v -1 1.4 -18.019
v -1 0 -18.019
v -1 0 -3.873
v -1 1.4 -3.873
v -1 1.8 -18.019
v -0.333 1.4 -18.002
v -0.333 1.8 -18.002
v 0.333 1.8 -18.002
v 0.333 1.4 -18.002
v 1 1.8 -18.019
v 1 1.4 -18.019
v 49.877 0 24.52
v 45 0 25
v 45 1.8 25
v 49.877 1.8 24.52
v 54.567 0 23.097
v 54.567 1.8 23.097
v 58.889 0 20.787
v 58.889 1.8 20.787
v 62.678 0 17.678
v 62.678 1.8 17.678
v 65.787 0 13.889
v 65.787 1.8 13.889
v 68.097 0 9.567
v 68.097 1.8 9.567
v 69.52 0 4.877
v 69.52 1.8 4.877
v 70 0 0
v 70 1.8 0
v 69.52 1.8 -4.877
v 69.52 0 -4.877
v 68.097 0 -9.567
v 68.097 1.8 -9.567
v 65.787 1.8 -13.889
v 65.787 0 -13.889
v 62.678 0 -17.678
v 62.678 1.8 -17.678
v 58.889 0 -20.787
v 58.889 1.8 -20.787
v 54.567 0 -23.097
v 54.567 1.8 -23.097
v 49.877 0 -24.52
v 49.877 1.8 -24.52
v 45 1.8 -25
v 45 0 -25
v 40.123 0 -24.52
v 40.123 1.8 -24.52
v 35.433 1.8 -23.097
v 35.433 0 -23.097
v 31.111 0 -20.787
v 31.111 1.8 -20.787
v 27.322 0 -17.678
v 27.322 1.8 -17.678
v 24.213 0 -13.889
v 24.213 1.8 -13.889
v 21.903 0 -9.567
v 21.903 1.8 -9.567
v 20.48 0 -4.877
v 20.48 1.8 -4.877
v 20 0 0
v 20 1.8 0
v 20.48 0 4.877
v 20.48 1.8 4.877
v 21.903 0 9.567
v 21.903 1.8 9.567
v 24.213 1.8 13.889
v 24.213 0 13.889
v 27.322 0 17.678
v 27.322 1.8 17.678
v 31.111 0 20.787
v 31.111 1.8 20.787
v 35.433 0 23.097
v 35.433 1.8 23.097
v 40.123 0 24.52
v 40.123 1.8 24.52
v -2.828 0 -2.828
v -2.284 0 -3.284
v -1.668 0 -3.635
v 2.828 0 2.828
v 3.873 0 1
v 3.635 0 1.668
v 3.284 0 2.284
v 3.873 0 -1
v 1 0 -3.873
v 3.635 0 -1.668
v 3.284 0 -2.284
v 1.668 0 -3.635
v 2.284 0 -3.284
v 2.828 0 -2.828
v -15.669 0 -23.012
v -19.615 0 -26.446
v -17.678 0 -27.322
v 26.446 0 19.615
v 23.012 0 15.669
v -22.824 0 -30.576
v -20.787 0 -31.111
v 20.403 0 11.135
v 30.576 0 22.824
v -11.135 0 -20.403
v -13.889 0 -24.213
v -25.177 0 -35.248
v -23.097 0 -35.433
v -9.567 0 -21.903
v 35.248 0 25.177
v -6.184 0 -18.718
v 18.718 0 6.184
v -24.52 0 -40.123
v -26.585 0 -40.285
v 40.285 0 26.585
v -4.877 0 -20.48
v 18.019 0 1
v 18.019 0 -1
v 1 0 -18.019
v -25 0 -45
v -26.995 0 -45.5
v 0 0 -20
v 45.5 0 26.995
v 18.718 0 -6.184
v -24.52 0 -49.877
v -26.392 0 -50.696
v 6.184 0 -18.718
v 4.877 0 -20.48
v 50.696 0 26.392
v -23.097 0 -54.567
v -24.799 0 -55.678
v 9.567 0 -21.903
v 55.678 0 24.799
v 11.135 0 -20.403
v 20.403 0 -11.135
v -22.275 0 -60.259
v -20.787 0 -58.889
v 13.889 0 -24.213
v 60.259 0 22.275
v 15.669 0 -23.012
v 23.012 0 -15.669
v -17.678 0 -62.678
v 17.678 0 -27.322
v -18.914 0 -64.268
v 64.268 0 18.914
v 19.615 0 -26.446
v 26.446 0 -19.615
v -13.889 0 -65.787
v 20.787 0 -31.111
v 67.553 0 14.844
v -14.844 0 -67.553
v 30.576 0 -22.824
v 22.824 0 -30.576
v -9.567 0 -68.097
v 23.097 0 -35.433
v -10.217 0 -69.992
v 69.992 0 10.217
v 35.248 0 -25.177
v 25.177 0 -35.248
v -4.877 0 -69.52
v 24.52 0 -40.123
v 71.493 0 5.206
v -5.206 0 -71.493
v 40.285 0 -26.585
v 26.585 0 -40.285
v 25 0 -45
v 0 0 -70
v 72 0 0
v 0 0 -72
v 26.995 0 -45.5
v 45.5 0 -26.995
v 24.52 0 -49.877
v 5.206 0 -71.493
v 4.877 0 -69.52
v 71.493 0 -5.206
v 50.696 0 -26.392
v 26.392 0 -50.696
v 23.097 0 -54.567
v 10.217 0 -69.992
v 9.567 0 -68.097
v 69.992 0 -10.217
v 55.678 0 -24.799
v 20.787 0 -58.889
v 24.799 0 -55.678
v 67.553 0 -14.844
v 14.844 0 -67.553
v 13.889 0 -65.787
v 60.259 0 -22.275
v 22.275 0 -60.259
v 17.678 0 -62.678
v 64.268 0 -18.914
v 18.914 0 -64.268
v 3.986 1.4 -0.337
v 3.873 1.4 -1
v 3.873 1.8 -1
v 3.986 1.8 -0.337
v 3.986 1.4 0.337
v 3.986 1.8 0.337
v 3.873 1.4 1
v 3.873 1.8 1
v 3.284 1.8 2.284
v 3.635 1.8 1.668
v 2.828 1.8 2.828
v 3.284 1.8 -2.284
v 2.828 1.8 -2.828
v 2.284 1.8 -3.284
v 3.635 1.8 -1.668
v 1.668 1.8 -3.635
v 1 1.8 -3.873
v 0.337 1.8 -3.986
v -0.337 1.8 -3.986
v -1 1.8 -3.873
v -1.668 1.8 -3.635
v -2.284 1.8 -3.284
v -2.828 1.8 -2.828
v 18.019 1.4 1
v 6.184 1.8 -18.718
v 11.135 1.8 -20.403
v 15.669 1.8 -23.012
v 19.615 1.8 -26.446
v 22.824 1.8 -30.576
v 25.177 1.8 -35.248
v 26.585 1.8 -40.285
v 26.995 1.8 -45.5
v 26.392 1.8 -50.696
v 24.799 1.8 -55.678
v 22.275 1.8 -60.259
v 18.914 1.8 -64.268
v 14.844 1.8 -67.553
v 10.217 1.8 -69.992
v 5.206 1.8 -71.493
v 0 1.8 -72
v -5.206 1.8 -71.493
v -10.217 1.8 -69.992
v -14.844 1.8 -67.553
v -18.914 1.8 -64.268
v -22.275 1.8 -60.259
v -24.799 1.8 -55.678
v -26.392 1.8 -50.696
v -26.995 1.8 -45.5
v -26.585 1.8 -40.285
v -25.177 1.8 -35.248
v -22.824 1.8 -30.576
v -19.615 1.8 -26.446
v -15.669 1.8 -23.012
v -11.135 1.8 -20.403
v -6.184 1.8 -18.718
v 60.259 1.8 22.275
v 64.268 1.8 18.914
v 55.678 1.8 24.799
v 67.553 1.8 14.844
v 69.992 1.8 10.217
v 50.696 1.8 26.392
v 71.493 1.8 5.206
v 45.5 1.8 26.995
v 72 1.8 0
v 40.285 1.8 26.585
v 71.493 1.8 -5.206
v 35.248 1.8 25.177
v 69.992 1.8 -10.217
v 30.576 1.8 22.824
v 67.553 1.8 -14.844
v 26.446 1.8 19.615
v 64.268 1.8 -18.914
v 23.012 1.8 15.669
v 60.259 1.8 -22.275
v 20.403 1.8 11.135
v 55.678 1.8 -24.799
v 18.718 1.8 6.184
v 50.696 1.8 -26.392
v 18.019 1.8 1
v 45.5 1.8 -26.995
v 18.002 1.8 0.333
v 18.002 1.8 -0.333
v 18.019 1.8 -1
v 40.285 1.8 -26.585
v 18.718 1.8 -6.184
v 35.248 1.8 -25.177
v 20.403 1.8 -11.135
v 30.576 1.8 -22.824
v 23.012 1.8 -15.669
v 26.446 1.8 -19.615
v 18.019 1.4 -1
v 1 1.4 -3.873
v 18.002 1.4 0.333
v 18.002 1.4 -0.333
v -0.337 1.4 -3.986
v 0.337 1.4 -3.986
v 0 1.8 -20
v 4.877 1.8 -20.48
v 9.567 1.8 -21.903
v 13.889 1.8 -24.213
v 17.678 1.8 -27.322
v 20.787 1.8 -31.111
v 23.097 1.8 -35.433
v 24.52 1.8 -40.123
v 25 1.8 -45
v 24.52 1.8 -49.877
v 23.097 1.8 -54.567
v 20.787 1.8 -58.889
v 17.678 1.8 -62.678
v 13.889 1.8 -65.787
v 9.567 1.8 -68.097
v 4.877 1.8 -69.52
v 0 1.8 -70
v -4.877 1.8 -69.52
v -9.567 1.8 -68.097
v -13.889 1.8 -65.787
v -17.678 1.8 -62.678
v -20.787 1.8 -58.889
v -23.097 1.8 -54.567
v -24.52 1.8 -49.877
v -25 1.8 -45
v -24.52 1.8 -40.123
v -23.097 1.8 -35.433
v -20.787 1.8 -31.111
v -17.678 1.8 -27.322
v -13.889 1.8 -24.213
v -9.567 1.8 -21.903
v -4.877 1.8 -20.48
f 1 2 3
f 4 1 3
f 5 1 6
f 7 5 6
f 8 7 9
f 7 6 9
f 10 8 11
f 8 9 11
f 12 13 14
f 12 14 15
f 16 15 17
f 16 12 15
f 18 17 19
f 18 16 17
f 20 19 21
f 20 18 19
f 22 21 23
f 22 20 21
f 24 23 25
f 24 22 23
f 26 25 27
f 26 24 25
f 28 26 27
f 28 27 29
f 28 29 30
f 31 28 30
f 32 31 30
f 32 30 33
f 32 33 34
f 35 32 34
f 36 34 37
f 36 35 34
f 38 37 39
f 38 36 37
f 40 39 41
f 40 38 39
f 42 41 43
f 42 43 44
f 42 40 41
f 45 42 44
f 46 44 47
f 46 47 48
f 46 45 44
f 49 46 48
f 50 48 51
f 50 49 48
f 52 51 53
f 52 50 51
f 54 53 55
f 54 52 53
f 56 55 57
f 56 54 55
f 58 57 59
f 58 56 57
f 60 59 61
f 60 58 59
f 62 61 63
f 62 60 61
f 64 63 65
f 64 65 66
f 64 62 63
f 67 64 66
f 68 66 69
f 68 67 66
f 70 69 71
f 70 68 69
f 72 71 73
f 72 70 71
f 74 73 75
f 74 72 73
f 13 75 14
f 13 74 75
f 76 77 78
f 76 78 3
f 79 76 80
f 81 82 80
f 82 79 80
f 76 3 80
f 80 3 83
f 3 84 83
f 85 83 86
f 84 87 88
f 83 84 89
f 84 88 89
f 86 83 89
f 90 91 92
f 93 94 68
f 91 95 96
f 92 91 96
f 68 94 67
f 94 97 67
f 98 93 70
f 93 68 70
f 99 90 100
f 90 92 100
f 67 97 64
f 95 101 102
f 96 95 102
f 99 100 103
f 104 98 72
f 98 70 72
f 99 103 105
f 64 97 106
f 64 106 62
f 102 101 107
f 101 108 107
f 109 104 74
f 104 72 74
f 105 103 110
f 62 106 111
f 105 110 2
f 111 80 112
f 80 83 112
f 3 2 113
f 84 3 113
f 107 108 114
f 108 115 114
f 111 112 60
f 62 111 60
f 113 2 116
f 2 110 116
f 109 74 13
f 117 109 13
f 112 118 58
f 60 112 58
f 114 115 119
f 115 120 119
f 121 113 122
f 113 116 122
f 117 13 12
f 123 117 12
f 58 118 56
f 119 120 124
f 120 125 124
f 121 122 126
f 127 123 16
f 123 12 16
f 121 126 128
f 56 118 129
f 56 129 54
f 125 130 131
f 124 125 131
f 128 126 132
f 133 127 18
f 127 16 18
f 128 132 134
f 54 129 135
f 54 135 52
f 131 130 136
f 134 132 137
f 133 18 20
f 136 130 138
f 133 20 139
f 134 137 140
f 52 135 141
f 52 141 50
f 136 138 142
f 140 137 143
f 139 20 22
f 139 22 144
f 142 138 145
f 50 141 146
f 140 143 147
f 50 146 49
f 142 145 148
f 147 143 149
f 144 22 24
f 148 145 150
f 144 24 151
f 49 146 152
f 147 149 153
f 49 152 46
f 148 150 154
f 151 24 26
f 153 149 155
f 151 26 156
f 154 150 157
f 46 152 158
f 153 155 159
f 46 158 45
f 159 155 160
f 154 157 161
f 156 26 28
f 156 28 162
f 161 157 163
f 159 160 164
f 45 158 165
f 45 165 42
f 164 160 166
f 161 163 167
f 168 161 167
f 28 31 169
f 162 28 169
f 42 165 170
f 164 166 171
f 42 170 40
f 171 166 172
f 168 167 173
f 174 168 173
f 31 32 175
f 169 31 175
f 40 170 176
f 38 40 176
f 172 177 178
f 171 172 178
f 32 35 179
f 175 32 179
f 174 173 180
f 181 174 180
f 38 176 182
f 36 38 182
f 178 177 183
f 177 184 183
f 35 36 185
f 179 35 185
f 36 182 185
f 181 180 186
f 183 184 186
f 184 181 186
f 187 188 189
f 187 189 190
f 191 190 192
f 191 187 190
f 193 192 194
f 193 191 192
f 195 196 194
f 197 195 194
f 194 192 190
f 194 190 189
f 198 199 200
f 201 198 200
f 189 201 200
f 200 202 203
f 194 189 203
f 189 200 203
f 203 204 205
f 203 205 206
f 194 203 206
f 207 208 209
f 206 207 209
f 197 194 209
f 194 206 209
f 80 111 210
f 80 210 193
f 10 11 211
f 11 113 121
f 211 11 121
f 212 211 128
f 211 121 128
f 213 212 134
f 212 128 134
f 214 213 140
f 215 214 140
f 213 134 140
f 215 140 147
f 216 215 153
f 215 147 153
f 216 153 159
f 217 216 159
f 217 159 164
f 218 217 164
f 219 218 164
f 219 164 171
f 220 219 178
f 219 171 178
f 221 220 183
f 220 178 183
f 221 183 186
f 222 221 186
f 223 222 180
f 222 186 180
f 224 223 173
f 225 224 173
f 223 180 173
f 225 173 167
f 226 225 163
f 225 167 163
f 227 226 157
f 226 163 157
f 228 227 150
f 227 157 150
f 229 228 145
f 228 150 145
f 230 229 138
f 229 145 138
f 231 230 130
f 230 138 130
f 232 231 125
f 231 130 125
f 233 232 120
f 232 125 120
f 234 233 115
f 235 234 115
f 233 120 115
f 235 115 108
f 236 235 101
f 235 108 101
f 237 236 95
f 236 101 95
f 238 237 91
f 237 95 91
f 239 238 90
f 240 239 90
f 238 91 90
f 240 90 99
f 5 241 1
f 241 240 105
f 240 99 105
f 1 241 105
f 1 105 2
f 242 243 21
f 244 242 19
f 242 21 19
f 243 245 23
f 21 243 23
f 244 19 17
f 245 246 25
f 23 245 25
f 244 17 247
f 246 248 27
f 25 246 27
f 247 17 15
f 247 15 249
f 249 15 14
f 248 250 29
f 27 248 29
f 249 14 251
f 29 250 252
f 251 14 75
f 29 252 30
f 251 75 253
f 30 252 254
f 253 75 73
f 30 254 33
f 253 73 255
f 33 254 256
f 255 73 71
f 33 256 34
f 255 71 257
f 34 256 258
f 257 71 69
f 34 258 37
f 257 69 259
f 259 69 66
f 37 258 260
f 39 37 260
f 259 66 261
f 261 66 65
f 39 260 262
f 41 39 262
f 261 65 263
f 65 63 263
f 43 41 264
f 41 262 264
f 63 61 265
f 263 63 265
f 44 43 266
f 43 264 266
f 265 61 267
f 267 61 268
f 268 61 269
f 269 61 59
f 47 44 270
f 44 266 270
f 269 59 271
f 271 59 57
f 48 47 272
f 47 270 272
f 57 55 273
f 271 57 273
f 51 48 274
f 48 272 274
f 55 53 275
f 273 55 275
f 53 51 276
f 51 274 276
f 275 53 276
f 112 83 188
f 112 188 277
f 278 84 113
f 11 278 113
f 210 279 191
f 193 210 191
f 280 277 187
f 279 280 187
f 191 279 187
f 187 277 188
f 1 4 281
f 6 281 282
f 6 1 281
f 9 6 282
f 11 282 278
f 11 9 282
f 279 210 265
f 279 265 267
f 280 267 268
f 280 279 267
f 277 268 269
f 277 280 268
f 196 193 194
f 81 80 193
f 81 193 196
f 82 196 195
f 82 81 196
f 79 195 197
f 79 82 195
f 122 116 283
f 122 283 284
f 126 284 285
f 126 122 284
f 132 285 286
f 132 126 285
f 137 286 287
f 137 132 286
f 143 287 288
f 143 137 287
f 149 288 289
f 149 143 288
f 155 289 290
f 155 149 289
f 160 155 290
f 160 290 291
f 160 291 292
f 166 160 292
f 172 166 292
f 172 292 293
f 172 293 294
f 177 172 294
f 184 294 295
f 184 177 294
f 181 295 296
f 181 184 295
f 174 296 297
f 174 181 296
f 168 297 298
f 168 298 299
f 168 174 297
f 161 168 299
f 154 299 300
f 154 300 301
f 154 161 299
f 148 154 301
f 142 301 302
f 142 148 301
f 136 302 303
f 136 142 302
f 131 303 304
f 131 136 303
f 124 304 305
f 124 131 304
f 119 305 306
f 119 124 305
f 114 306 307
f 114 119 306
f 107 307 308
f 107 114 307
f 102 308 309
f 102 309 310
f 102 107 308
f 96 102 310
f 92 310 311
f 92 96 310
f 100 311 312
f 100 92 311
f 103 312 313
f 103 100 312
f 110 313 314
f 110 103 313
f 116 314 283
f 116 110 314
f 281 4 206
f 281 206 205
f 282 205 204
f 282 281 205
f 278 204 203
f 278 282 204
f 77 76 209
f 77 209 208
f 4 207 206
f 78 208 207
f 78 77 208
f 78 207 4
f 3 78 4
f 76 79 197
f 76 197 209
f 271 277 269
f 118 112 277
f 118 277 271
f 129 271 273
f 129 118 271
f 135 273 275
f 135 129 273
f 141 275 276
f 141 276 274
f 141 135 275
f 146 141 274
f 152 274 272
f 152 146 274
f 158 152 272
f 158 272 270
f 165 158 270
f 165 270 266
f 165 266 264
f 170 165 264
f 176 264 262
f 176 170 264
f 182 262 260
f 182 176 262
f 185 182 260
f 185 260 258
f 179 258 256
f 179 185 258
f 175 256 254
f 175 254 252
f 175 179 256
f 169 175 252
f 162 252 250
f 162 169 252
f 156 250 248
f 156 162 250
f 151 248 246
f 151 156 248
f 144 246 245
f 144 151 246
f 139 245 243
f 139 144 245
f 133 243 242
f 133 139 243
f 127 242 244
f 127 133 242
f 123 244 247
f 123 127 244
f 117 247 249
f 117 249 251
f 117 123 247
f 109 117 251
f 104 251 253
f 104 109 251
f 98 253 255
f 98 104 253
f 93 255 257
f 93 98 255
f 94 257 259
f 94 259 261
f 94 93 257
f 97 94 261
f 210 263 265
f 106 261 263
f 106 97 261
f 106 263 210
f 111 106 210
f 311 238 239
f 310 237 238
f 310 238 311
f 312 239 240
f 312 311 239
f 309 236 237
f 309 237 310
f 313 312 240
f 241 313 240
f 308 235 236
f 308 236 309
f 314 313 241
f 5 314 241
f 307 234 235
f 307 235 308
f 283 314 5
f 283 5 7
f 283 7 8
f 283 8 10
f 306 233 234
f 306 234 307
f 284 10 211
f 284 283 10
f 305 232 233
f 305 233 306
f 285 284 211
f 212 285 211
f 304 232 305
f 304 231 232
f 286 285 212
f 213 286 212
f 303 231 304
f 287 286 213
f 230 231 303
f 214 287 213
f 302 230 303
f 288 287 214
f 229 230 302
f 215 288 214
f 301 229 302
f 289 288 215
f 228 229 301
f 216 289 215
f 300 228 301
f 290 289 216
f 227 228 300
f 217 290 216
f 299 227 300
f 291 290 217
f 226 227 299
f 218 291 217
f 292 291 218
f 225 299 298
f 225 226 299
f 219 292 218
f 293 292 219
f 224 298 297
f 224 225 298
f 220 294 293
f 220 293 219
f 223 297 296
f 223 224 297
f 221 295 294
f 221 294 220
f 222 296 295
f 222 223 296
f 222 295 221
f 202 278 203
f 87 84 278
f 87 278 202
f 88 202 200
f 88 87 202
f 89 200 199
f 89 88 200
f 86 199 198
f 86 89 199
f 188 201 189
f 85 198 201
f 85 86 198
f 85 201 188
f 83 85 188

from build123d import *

# Parameters (mm, degrees)
BOSS_EXTRUDE1_DEPTH   = 1.8
SKETCH1_R             = 27
SKETCH1_R_2           = 25
BOSS_EXTRUDE1_2_DEPTH = 1.8
BOSS_EXTRUDE1_3_DEPTH = 1.8
BOSS_EXTRUDE2_DEPTH   = 1.4


with BuildPart() as part:
    # Sketch1 → Boss-Extrude1 (new body)
    with BuildSketch(Plane(origin=(0, 0, 0), x_dir=(1, 0, 0), z_dir=(0, 1, 0))):
        with BuildLine():
            ThreePointArc((2.828427125, -2.828427125), (2.828427125, 2.828427125), (-2.828427125, 2.828427125))
            Line((-2.828427125, 2.828427125), (2.828427125, -2.828427125))
        make_face()
    extrude(amount=BOSS_EXTRUDE1_DEPTH)



with BuildPart() as body_2:
    # Sketch1 → Boss-Extrude1 2 (new body)
    with BuildSketch(Plane(origin=(0, 0, 0), x_dir=(1, 0, 0), z_dir=(0, 1, 0))):
        with Locations((0, 45)):
            Circle(SKETCH1_R)
        with Locations((0, 45)):
            Circle(SKETCH1_R_2, mode=Mode.SUBTRACT)
    extrude(amount=BOSS_EXTRUDE1_2_DEPTH)


with BuildPart() as body_3:
    # Sketch1 → Boss-Extrude1 3 (new body)
    with BuildSketch(Plane(origin=(0, 0, 0), x_dir=(1, 0, 0), z_dir=(0, 1, 0))):
        with Locations((45, 0)):
            Circle(SKETCH1_R)
        with Locations((45, 0)):
            Circle(SKETCH1_R_2, mode=Mode.SUBTRACT)
    extrude(amount=BOSS_EXTRUDE1_3_DEPTH)


with BuildPart() as part_1:
    add(part.part)

    add(body_2.part)  # Boss-Extrude2 merges body 2

    add(body_3.part)  # Boss-Extrude2 merges body 3
    # Sketch1<3> → Boss-Extrude2 (add)
    with BuildSketch(Plane(origin=(0, 0, 0), x_dir=(1, 0, 0), z_dir=(0, 1, 0))):
        with BuildLine():
            Line((-1, 18.018524874), (-1, 3.872983346))
            ThreePointArc((-1, 3.872983346), (0, 4), (1, 3.872983346))
            Line((1, 3.872983346), (1, 18.018524874))
            ThreePointArc((1, 18.018524874), (0, 18), (-1, 18.018524874))
        make_face()
        with BuildLine():
            ThreePointArc((3.872983346, 1), (4, 0), (3.872983346, -1))
            Line((3.872983346, -1), (18.018524874, -1))
            ThreePointArc((18.018524874, -1), (18, 0), (18.018524874, 1))
            Line((18.018524874, 1), (3.872983346, 1))
        make_face()
    extrude(amount=BOSS_EXTRUDE2_DEPTH)


solid = part_1.part
